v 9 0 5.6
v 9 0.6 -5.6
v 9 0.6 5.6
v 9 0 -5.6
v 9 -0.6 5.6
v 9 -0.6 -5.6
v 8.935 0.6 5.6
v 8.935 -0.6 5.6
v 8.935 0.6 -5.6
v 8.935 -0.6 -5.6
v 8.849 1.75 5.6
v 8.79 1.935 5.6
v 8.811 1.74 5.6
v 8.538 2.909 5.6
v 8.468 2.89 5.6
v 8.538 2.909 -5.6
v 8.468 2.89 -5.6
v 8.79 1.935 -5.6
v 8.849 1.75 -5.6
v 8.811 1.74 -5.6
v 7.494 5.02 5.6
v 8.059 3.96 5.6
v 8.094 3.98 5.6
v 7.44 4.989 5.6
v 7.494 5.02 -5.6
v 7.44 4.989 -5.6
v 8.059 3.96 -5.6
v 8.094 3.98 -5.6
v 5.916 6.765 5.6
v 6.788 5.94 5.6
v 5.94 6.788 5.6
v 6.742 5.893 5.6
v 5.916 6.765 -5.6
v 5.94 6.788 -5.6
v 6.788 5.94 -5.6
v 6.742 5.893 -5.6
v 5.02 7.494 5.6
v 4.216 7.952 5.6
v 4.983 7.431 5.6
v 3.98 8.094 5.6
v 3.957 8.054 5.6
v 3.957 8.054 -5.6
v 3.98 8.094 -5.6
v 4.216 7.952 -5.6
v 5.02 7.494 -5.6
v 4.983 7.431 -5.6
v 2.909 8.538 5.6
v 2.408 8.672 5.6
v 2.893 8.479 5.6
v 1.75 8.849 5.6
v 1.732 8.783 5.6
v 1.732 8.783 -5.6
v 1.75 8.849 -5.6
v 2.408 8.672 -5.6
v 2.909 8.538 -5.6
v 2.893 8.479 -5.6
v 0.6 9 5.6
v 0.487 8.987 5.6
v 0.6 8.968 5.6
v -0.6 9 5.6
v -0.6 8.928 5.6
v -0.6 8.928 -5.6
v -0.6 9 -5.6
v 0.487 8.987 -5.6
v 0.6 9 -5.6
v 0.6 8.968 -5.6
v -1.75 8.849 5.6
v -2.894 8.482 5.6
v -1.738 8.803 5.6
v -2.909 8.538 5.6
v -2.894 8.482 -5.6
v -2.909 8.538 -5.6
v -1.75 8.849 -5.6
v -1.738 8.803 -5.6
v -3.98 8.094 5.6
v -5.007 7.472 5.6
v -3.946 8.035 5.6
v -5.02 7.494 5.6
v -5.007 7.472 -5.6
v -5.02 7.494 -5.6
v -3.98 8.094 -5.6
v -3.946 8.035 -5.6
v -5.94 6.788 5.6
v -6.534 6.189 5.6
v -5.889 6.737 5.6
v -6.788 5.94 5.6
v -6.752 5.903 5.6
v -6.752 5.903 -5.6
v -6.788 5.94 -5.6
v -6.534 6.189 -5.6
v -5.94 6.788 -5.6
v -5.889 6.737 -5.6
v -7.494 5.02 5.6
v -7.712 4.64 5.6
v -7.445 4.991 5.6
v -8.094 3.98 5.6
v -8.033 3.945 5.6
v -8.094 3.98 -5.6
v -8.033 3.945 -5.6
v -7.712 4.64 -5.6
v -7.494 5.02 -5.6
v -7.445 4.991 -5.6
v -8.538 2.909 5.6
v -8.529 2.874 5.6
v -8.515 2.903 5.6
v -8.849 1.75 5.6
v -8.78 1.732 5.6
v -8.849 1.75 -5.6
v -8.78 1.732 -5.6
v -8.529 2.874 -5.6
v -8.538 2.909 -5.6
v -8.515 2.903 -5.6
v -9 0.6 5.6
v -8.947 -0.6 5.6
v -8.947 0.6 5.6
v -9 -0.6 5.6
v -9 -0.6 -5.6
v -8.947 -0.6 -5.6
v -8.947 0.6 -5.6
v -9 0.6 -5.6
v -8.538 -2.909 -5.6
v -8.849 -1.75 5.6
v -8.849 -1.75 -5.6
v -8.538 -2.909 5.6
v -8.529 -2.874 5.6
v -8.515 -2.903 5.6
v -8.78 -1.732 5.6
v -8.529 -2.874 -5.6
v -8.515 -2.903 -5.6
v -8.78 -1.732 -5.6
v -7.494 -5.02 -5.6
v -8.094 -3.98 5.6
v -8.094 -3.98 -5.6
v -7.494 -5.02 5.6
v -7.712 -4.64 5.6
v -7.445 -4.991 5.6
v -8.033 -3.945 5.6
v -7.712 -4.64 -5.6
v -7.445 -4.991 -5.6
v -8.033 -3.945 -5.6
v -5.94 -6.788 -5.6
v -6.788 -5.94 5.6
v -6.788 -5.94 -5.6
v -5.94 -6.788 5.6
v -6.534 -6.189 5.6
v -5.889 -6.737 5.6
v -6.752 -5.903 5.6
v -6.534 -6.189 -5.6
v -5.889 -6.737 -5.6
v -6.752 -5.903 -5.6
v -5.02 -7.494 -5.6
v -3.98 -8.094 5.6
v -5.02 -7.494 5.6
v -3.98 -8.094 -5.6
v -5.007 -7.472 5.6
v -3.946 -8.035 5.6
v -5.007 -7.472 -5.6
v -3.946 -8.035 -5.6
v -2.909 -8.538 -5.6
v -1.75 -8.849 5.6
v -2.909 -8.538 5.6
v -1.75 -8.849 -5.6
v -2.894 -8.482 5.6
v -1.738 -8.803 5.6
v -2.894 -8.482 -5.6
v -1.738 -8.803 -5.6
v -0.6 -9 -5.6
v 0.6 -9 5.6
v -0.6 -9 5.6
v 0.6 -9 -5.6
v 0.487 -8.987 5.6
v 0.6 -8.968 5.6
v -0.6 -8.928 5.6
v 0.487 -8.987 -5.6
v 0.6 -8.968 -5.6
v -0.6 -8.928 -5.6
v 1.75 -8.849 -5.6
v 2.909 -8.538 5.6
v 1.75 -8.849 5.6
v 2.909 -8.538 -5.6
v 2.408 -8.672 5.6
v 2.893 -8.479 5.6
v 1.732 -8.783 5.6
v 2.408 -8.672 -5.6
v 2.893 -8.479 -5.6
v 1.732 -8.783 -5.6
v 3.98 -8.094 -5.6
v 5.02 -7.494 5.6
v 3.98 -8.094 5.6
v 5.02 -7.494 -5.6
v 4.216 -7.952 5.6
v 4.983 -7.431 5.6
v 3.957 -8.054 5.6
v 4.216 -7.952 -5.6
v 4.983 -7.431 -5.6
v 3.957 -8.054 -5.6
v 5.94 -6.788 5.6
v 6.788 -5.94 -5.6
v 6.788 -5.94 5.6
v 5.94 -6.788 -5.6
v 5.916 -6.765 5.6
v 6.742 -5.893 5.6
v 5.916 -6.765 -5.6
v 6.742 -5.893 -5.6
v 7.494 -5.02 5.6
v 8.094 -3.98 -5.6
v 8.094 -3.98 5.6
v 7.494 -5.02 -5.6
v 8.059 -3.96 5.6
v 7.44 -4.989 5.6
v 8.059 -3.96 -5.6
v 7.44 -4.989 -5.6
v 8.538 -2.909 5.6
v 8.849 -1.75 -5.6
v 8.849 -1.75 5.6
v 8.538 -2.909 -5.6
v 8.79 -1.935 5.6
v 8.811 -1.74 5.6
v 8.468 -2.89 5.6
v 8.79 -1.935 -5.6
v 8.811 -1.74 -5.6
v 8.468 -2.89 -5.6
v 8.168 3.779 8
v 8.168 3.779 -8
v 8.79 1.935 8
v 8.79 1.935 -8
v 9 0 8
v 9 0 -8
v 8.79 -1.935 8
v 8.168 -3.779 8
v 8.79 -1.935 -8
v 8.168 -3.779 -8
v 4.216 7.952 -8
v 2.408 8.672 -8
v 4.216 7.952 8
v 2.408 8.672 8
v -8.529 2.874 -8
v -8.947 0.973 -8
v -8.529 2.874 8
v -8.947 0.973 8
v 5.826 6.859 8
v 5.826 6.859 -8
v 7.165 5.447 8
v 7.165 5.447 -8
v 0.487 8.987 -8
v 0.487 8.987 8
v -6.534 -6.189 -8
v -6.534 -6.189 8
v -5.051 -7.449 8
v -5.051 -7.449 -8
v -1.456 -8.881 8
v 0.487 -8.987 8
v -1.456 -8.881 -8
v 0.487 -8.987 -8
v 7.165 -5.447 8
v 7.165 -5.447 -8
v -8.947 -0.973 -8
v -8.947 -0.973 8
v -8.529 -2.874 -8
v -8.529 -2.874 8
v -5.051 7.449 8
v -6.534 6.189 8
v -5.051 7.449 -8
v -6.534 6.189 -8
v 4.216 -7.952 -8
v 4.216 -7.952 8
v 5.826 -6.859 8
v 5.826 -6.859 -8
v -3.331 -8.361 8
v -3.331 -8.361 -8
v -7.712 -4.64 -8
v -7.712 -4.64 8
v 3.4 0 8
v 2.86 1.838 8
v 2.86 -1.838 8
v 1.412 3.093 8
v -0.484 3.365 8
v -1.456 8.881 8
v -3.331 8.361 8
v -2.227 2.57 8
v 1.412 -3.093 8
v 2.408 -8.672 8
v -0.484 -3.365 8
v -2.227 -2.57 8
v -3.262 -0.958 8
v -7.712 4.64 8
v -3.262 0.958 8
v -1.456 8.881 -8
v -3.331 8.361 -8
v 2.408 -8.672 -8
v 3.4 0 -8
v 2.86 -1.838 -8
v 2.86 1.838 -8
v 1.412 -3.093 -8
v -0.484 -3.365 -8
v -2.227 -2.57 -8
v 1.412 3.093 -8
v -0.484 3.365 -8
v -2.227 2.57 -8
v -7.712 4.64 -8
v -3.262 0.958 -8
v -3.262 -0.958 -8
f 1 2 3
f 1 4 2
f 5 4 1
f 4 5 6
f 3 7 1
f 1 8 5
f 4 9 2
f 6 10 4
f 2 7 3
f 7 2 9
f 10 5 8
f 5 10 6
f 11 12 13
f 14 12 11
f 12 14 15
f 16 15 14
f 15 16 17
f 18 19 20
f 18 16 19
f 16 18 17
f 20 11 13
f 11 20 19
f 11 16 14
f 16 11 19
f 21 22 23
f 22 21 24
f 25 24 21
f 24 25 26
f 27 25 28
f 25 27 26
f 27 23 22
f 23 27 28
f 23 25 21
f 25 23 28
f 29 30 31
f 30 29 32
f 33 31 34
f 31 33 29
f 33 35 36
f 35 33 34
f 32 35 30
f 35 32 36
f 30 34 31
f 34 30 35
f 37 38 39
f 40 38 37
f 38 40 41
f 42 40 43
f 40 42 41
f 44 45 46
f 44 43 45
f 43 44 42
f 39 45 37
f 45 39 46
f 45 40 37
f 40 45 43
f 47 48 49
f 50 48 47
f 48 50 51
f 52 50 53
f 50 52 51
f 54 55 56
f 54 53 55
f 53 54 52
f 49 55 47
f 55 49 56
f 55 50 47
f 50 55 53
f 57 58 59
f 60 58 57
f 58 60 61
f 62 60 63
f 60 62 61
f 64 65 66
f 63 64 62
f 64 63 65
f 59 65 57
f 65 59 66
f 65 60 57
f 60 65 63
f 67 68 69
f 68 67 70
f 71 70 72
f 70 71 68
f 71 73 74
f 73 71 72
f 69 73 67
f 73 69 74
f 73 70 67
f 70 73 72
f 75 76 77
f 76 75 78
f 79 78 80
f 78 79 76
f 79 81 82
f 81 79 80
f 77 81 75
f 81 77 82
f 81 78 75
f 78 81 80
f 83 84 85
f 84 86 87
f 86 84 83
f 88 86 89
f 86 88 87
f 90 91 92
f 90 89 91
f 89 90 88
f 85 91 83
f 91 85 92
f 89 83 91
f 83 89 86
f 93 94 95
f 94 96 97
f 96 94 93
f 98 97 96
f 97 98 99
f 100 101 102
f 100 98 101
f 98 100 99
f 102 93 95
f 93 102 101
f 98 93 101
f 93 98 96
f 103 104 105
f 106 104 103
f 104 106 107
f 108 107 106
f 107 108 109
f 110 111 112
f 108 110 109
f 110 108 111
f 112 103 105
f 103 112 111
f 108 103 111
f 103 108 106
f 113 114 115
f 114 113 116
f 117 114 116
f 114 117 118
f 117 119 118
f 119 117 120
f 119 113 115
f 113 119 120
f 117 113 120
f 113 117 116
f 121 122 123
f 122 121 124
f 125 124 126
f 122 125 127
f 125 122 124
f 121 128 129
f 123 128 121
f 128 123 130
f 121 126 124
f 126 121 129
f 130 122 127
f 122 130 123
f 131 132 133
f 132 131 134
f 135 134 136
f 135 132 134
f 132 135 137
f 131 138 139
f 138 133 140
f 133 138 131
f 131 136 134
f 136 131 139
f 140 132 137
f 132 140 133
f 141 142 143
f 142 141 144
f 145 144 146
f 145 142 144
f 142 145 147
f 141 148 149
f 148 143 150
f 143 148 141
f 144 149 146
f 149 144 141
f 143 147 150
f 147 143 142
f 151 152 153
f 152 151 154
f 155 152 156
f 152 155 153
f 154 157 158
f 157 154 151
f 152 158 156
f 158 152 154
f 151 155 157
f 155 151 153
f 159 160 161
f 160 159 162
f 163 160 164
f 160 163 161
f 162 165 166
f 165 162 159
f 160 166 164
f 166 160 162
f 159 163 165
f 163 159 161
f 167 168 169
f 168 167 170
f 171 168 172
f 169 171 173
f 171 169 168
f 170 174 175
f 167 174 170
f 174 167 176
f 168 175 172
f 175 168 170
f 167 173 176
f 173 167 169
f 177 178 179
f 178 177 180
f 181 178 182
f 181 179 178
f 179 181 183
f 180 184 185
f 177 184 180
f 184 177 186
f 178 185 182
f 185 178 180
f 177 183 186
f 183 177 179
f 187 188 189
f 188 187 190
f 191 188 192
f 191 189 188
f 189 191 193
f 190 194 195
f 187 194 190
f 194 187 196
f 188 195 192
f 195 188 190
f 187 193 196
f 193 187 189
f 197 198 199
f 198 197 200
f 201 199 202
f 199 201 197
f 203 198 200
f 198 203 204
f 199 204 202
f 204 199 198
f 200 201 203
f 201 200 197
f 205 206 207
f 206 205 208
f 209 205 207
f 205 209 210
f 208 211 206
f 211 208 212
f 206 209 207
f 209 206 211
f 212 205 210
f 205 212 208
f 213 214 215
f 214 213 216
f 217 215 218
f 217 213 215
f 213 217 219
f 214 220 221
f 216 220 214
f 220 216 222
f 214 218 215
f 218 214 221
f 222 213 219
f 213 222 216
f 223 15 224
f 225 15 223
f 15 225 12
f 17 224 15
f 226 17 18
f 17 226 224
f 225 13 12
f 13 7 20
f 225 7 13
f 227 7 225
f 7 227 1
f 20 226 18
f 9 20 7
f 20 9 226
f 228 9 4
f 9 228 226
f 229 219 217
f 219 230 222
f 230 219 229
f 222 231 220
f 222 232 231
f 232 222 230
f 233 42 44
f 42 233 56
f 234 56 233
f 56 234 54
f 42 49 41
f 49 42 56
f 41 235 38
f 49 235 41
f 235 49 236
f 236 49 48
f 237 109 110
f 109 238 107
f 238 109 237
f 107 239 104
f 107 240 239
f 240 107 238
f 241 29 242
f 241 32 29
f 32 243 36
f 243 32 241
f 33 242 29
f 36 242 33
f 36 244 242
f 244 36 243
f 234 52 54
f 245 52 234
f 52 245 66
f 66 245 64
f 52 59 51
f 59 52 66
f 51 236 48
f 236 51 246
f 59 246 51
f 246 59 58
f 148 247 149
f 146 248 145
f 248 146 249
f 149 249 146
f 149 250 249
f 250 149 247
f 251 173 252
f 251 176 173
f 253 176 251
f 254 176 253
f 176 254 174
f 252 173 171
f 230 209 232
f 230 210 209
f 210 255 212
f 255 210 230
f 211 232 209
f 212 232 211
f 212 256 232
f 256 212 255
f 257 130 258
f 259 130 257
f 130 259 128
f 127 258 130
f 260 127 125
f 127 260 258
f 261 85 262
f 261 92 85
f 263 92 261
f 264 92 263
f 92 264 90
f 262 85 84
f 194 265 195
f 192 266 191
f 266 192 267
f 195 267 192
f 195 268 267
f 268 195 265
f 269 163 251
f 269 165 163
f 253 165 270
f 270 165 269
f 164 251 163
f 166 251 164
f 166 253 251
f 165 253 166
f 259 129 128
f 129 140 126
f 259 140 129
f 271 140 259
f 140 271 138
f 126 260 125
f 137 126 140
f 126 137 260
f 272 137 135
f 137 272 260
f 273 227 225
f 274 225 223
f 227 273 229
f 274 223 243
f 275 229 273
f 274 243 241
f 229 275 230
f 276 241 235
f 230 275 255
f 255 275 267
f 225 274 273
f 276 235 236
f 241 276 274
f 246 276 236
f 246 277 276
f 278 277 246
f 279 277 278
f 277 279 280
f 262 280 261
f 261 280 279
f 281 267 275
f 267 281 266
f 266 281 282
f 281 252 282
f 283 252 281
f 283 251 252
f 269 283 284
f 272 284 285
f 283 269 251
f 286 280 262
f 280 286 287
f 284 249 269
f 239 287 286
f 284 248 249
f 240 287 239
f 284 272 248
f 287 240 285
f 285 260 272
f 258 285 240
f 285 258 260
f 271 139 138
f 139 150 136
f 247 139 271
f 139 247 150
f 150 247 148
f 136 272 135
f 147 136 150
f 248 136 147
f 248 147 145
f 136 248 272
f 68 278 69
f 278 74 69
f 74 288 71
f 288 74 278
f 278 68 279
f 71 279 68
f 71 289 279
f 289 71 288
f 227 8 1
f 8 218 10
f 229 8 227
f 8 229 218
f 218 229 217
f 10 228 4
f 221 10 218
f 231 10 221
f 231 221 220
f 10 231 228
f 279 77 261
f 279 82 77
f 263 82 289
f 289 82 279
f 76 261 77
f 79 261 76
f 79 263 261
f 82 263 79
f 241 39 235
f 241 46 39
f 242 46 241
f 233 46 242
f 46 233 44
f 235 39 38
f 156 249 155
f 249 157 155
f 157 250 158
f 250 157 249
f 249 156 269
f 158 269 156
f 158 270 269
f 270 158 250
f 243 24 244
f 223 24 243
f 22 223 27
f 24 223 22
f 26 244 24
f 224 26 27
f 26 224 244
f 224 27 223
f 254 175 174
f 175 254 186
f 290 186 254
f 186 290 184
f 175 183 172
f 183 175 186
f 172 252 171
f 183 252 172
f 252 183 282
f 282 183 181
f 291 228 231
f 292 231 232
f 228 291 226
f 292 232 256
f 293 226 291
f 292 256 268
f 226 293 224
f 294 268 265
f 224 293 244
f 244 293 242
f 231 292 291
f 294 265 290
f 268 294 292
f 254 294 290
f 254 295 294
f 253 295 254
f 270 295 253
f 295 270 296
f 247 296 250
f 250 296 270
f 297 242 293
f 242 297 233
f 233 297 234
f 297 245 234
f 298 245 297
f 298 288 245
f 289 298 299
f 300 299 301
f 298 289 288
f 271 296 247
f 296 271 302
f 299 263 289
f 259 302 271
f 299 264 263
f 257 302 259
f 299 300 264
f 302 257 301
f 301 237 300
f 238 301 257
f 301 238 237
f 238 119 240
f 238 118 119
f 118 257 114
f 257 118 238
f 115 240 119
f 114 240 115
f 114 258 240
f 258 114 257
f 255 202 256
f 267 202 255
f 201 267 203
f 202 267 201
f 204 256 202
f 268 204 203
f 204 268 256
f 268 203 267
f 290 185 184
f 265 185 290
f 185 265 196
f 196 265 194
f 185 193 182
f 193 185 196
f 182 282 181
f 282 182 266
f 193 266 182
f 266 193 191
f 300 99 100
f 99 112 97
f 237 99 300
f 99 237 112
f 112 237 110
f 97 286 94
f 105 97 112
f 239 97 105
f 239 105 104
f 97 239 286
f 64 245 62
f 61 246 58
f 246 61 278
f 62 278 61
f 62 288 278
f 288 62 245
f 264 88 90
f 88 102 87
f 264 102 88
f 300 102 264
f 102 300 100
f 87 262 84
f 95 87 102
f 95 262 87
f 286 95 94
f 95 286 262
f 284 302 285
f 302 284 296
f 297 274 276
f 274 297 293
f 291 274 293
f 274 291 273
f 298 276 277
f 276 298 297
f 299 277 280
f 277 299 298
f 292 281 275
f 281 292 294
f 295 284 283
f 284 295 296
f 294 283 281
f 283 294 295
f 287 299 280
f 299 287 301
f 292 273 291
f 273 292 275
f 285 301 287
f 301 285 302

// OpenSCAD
// Parameters
screw_diameter = 8.0; //[4.0:16.0:0.1]
outer_diameter = 18.0; //[9.0:36.0:0.1]
length = 16.0; //[8.0:32.0:0.1]
thread_pitch_mm = 1.25; //[0.5:3.0:0.05]
bore_diameter_for_modeling = 6.8; //[5.0:8.0:0.05]
lead_in_chamfer_height = 1.0; //[0.5:2.0:0.05]
lead_in_chamfer_angle_deg = 30; //[15:60:1]
installation_end_chamfer_height = 0.8; //[0.4:1.6:0.05]
knurl_depth = 0.6; //[0.3:1.2:0.05]
knurl_pitch = 1.2; //[0.6:2.4:0.05]
knurl_count = 24; //[8:64:1]
tolerance_outer_diameter = 0.0; //[-0.5:0.5:0.05]
tolerance_length = 0.0; //[-0.5:0.5:0.05]
overlap = 0.8; //[0.5:2.0:0.1]
rib_width = 1.2; //[0.6:2.4:0.05]
rib_height_fraction = 0.7; //[0.4:1.0:0.05]

// Module for the heat-set insert
module insert() {
  color("Brass") {
    // Main body
    cylinder(
      r=(outer_diameter + tolerance_outer_diameter) / 2,
      h=length + tolerance_length,
      center=true
    );

    // Lead-in chamfer
    translate([0, 0, ((length + tolerance_length) / 2) - (lead_in_chamfer_height + overlap) / 2])
      cylinder(
        r1=(outer_diameter + tolerance_outer_diameter) / 2,
        r2=((outer_diameter + tolerance_outer_diameter) / 2) - lead_in_chamfer_height,
        h=lead_in_chamfer_height + overlap,
        center=true
      );

    // Installation end chamfer
    translate([0, 0, -((length + tolerance_length) / 2) + (installation_end_chamfer_height + overlap) / 2])
      rotate([180, 0, 0])
      cylinder(
        r1=(outer_diameter + tolerance_outer_diameter) / 2,
        r2=((outer_diameter + tolerance_outer_diameter) / 2) - installation_end_chamfer_height,
        h=installation_end_chamfer_height + overlap,
        center=true
      );

    // Ribs for knurling
    for (i = [0:knurl_count-1]) {
      rotate([0, 0, i * 360 / knurl_count])
      translate([((outer_diameter + tolerance_outer_diameter) / 2) - (knurl_depth + overlap) / 2, 0, 0])
      cube(
        [knurl_depth + overlap, rib_width, (length + tolerance_length) * rib_height_fraction],
        center=true
      );
    }
  }
}

// Module for the threaded insert
module threaded_insert() {
  difference() {
    insert();
    // Internal bore for threading
    cylinder(
      r=bore_diameter_for_modeling / 2,
      h=(length + tolerance_length) + 2 * overlap,
      center=true
    );
  }
}

// Assembly of the insert
module assembly() {
  threaded_insert();
}

assembly();
